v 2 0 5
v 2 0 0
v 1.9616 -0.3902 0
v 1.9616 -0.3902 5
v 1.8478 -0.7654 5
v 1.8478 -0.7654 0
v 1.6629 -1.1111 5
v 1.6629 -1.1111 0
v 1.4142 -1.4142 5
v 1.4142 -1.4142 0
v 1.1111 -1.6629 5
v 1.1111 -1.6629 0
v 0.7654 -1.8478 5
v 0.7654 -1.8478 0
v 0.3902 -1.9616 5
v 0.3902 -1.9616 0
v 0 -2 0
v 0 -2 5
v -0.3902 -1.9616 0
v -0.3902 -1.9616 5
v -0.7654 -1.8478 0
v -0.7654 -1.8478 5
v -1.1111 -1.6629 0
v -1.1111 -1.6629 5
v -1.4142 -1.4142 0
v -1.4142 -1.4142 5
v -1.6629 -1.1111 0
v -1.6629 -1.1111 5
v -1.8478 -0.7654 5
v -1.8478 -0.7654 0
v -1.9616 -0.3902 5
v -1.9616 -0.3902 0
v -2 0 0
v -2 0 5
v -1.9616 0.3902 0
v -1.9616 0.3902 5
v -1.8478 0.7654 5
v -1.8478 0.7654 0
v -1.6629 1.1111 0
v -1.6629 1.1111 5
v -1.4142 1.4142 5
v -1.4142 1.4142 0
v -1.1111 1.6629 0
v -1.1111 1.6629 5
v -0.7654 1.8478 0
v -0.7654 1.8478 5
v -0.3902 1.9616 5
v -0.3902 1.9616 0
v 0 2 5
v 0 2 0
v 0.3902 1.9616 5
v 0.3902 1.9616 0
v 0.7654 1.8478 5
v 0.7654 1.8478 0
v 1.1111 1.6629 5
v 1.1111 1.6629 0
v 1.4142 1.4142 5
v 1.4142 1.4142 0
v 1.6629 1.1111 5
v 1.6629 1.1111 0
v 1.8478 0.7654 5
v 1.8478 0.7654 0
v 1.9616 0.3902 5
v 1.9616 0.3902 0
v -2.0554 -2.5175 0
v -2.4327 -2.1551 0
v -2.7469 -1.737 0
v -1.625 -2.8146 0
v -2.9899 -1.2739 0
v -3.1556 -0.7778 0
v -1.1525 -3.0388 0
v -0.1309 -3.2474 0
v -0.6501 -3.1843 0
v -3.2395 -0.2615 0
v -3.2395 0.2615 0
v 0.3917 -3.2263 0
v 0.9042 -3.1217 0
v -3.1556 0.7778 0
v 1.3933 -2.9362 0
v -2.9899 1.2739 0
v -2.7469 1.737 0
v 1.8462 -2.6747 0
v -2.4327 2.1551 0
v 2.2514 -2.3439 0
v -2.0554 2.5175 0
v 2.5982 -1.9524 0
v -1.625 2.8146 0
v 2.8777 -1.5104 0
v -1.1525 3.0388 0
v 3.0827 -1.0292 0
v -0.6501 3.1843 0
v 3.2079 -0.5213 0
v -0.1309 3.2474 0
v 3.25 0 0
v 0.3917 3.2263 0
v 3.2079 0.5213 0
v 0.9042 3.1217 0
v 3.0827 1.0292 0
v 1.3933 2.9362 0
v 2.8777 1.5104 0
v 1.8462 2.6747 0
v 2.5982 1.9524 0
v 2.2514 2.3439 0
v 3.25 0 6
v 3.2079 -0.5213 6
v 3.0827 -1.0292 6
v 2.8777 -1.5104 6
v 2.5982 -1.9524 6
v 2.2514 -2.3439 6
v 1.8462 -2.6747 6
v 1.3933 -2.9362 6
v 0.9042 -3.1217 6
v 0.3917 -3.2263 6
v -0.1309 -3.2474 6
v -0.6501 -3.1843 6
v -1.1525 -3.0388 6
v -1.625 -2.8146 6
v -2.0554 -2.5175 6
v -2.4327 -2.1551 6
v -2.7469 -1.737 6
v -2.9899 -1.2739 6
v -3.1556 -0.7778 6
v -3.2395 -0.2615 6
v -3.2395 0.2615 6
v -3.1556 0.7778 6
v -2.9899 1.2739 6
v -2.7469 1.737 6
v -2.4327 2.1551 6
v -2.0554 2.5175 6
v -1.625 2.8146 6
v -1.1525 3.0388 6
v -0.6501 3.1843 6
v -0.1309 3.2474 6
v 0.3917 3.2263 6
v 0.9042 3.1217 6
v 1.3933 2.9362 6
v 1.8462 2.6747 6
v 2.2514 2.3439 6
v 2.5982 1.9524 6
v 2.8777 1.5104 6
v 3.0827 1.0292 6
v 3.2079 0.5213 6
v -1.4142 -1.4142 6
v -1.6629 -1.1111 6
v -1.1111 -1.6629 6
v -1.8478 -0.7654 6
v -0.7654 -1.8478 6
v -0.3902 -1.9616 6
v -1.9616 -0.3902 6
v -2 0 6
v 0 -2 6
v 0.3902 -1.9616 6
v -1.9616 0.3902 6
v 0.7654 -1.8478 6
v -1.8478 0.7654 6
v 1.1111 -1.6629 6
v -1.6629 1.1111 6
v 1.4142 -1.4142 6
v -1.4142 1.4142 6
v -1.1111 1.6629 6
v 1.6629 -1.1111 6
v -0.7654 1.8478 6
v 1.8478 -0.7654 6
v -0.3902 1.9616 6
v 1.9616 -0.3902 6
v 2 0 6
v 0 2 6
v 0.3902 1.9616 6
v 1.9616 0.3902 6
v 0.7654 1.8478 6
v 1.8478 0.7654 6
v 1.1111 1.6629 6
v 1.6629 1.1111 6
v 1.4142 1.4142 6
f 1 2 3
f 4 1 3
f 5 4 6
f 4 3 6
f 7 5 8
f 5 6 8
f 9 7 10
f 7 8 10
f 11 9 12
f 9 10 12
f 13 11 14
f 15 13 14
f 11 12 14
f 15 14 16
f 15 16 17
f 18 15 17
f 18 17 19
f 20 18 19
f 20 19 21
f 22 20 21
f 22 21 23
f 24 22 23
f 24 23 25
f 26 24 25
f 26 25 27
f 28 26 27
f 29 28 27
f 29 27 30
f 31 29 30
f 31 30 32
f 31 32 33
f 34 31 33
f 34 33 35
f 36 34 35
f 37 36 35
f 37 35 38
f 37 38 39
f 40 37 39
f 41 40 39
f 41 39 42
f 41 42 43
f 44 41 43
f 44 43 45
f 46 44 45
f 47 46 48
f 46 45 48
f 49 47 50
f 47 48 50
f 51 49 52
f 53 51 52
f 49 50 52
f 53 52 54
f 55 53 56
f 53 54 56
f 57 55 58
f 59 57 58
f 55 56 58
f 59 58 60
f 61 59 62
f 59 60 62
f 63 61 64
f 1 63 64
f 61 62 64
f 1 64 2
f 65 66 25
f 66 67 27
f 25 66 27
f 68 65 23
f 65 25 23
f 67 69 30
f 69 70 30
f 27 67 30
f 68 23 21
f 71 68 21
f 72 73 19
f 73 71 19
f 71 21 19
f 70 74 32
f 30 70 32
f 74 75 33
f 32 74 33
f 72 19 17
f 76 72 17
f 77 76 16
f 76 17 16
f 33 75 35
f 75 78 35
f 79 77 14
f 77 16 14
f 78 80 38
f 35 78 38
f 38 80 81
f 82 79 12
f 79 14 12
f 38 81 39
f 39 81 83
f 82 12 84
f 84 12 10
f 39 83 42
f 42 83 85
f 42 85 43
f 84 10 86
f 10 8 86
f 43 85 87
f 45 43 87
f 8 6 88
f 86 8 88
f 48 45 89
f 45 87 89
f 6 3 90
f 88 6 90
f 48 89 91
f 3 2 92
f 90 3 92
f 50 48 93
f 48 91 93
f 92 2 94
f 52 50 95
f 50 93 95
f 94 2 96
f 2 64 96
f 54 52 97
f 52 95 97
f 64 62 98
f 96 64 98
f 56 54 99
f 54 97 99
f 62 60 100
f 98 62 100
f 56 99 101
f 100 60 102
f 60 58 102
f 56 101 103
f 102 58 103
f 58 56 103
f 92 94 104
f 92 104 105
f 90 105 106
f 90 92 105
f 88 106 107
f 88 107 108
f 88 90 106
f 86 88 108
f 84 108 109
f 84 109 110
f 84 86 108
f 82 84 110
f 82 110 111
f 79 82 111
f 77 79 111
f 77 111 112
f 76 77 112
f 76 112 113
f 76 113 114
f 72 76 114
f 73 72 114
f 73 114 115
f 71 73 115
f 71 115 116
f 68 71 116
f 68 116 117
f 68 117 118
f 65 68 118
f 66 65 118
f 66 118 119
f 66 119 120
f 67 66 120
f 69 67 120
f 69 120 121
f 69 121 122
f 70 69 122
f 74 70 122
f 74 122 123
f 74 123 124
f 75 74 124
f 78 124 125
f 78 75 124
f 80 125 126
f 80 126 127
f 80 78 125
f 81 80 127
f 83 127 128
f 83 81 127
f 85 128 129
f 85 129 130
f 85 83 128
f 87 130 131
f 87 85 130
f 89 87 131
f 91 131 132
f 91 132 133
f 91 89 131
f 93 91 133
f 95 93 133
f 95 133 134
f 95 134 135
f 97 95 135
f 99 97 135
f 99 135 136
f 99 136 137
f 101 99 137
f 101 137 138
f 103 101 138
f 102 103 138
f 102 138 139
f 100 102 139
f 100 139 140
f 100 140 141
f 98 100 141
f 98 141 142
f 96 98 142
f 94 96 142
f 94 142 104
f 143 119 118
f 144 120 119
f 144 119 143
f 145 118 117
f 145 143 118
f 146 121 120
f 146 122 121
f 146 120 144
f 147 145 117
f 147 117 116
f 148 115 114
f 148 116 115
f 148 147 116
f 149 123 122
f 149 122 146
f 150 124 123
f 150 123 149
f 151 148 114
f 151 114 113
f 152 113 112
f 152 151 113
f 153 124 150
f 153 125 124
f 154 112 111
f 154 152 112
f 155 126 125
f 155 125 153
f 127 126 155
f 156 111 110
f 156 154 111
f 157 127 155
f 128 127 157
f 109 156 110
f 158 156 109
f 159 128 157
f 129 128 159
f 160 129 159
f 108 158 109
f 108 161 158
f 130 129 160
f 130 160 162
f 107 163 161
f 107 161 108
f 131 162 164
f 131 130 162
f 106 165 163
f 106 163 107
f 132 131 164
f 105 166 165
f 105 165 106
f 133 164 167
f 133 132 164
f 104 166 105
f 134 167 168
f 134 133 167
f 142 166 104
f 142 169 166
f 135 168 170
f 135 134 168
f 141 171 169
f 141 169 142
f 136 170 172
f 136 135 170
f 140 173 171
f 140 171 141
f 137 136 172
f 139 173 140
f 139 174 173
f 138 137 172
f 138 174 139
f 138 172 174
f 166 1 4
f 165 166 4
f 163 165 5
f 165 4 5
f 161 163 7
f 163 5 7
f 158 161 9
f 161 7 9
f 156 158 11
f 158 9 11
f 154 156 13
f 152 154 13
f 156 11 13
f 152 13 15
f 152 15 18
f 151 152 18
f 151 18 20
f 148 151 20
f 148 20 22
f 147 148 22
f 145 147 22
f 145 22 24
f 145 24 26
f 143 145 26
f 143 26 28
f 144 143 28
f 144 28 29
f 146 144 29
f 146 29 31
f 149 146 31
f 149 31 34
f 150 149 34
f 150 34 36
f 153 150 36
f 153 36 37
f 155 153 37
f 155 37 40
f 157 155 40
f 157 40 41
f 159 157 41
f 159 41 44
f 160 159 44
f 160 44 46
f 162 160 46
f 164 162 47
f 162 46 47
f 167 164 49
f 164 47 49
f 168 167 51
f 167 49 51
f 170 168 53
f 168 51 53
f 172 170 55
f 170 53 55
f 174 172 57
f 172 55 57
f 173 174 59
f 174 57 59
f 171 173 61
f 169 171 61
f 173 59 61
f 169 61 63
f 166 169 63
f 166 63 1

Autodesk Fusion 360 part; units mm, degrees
sketch "Sketch1" plane through (0, 0, 0) normal (0, 0, 1) x (1, 0, 0)
  circle A0 centre (0, 0) radius 2
  circle A1 centre (0, 0) radius 2.75
  dimension "d5" = 4
  dimension "d8" = 5.5
extrude "Extrude2" add sketch "Sketch1" along normal blind 6.6
move_face "OffsetFaces1" offset 0.5 1 faces at (2.7466, -0.1371, 4.4)
extrude "Extrude3" cut 1 faces at (2.8212, 0.1615, 6.6) along direction (0, 0, -1) blind 1.6
extrude "Extrude4" add 1 faces at (2.8212, 0.1615, 5) along direction (0, 0, 1) blind 1
